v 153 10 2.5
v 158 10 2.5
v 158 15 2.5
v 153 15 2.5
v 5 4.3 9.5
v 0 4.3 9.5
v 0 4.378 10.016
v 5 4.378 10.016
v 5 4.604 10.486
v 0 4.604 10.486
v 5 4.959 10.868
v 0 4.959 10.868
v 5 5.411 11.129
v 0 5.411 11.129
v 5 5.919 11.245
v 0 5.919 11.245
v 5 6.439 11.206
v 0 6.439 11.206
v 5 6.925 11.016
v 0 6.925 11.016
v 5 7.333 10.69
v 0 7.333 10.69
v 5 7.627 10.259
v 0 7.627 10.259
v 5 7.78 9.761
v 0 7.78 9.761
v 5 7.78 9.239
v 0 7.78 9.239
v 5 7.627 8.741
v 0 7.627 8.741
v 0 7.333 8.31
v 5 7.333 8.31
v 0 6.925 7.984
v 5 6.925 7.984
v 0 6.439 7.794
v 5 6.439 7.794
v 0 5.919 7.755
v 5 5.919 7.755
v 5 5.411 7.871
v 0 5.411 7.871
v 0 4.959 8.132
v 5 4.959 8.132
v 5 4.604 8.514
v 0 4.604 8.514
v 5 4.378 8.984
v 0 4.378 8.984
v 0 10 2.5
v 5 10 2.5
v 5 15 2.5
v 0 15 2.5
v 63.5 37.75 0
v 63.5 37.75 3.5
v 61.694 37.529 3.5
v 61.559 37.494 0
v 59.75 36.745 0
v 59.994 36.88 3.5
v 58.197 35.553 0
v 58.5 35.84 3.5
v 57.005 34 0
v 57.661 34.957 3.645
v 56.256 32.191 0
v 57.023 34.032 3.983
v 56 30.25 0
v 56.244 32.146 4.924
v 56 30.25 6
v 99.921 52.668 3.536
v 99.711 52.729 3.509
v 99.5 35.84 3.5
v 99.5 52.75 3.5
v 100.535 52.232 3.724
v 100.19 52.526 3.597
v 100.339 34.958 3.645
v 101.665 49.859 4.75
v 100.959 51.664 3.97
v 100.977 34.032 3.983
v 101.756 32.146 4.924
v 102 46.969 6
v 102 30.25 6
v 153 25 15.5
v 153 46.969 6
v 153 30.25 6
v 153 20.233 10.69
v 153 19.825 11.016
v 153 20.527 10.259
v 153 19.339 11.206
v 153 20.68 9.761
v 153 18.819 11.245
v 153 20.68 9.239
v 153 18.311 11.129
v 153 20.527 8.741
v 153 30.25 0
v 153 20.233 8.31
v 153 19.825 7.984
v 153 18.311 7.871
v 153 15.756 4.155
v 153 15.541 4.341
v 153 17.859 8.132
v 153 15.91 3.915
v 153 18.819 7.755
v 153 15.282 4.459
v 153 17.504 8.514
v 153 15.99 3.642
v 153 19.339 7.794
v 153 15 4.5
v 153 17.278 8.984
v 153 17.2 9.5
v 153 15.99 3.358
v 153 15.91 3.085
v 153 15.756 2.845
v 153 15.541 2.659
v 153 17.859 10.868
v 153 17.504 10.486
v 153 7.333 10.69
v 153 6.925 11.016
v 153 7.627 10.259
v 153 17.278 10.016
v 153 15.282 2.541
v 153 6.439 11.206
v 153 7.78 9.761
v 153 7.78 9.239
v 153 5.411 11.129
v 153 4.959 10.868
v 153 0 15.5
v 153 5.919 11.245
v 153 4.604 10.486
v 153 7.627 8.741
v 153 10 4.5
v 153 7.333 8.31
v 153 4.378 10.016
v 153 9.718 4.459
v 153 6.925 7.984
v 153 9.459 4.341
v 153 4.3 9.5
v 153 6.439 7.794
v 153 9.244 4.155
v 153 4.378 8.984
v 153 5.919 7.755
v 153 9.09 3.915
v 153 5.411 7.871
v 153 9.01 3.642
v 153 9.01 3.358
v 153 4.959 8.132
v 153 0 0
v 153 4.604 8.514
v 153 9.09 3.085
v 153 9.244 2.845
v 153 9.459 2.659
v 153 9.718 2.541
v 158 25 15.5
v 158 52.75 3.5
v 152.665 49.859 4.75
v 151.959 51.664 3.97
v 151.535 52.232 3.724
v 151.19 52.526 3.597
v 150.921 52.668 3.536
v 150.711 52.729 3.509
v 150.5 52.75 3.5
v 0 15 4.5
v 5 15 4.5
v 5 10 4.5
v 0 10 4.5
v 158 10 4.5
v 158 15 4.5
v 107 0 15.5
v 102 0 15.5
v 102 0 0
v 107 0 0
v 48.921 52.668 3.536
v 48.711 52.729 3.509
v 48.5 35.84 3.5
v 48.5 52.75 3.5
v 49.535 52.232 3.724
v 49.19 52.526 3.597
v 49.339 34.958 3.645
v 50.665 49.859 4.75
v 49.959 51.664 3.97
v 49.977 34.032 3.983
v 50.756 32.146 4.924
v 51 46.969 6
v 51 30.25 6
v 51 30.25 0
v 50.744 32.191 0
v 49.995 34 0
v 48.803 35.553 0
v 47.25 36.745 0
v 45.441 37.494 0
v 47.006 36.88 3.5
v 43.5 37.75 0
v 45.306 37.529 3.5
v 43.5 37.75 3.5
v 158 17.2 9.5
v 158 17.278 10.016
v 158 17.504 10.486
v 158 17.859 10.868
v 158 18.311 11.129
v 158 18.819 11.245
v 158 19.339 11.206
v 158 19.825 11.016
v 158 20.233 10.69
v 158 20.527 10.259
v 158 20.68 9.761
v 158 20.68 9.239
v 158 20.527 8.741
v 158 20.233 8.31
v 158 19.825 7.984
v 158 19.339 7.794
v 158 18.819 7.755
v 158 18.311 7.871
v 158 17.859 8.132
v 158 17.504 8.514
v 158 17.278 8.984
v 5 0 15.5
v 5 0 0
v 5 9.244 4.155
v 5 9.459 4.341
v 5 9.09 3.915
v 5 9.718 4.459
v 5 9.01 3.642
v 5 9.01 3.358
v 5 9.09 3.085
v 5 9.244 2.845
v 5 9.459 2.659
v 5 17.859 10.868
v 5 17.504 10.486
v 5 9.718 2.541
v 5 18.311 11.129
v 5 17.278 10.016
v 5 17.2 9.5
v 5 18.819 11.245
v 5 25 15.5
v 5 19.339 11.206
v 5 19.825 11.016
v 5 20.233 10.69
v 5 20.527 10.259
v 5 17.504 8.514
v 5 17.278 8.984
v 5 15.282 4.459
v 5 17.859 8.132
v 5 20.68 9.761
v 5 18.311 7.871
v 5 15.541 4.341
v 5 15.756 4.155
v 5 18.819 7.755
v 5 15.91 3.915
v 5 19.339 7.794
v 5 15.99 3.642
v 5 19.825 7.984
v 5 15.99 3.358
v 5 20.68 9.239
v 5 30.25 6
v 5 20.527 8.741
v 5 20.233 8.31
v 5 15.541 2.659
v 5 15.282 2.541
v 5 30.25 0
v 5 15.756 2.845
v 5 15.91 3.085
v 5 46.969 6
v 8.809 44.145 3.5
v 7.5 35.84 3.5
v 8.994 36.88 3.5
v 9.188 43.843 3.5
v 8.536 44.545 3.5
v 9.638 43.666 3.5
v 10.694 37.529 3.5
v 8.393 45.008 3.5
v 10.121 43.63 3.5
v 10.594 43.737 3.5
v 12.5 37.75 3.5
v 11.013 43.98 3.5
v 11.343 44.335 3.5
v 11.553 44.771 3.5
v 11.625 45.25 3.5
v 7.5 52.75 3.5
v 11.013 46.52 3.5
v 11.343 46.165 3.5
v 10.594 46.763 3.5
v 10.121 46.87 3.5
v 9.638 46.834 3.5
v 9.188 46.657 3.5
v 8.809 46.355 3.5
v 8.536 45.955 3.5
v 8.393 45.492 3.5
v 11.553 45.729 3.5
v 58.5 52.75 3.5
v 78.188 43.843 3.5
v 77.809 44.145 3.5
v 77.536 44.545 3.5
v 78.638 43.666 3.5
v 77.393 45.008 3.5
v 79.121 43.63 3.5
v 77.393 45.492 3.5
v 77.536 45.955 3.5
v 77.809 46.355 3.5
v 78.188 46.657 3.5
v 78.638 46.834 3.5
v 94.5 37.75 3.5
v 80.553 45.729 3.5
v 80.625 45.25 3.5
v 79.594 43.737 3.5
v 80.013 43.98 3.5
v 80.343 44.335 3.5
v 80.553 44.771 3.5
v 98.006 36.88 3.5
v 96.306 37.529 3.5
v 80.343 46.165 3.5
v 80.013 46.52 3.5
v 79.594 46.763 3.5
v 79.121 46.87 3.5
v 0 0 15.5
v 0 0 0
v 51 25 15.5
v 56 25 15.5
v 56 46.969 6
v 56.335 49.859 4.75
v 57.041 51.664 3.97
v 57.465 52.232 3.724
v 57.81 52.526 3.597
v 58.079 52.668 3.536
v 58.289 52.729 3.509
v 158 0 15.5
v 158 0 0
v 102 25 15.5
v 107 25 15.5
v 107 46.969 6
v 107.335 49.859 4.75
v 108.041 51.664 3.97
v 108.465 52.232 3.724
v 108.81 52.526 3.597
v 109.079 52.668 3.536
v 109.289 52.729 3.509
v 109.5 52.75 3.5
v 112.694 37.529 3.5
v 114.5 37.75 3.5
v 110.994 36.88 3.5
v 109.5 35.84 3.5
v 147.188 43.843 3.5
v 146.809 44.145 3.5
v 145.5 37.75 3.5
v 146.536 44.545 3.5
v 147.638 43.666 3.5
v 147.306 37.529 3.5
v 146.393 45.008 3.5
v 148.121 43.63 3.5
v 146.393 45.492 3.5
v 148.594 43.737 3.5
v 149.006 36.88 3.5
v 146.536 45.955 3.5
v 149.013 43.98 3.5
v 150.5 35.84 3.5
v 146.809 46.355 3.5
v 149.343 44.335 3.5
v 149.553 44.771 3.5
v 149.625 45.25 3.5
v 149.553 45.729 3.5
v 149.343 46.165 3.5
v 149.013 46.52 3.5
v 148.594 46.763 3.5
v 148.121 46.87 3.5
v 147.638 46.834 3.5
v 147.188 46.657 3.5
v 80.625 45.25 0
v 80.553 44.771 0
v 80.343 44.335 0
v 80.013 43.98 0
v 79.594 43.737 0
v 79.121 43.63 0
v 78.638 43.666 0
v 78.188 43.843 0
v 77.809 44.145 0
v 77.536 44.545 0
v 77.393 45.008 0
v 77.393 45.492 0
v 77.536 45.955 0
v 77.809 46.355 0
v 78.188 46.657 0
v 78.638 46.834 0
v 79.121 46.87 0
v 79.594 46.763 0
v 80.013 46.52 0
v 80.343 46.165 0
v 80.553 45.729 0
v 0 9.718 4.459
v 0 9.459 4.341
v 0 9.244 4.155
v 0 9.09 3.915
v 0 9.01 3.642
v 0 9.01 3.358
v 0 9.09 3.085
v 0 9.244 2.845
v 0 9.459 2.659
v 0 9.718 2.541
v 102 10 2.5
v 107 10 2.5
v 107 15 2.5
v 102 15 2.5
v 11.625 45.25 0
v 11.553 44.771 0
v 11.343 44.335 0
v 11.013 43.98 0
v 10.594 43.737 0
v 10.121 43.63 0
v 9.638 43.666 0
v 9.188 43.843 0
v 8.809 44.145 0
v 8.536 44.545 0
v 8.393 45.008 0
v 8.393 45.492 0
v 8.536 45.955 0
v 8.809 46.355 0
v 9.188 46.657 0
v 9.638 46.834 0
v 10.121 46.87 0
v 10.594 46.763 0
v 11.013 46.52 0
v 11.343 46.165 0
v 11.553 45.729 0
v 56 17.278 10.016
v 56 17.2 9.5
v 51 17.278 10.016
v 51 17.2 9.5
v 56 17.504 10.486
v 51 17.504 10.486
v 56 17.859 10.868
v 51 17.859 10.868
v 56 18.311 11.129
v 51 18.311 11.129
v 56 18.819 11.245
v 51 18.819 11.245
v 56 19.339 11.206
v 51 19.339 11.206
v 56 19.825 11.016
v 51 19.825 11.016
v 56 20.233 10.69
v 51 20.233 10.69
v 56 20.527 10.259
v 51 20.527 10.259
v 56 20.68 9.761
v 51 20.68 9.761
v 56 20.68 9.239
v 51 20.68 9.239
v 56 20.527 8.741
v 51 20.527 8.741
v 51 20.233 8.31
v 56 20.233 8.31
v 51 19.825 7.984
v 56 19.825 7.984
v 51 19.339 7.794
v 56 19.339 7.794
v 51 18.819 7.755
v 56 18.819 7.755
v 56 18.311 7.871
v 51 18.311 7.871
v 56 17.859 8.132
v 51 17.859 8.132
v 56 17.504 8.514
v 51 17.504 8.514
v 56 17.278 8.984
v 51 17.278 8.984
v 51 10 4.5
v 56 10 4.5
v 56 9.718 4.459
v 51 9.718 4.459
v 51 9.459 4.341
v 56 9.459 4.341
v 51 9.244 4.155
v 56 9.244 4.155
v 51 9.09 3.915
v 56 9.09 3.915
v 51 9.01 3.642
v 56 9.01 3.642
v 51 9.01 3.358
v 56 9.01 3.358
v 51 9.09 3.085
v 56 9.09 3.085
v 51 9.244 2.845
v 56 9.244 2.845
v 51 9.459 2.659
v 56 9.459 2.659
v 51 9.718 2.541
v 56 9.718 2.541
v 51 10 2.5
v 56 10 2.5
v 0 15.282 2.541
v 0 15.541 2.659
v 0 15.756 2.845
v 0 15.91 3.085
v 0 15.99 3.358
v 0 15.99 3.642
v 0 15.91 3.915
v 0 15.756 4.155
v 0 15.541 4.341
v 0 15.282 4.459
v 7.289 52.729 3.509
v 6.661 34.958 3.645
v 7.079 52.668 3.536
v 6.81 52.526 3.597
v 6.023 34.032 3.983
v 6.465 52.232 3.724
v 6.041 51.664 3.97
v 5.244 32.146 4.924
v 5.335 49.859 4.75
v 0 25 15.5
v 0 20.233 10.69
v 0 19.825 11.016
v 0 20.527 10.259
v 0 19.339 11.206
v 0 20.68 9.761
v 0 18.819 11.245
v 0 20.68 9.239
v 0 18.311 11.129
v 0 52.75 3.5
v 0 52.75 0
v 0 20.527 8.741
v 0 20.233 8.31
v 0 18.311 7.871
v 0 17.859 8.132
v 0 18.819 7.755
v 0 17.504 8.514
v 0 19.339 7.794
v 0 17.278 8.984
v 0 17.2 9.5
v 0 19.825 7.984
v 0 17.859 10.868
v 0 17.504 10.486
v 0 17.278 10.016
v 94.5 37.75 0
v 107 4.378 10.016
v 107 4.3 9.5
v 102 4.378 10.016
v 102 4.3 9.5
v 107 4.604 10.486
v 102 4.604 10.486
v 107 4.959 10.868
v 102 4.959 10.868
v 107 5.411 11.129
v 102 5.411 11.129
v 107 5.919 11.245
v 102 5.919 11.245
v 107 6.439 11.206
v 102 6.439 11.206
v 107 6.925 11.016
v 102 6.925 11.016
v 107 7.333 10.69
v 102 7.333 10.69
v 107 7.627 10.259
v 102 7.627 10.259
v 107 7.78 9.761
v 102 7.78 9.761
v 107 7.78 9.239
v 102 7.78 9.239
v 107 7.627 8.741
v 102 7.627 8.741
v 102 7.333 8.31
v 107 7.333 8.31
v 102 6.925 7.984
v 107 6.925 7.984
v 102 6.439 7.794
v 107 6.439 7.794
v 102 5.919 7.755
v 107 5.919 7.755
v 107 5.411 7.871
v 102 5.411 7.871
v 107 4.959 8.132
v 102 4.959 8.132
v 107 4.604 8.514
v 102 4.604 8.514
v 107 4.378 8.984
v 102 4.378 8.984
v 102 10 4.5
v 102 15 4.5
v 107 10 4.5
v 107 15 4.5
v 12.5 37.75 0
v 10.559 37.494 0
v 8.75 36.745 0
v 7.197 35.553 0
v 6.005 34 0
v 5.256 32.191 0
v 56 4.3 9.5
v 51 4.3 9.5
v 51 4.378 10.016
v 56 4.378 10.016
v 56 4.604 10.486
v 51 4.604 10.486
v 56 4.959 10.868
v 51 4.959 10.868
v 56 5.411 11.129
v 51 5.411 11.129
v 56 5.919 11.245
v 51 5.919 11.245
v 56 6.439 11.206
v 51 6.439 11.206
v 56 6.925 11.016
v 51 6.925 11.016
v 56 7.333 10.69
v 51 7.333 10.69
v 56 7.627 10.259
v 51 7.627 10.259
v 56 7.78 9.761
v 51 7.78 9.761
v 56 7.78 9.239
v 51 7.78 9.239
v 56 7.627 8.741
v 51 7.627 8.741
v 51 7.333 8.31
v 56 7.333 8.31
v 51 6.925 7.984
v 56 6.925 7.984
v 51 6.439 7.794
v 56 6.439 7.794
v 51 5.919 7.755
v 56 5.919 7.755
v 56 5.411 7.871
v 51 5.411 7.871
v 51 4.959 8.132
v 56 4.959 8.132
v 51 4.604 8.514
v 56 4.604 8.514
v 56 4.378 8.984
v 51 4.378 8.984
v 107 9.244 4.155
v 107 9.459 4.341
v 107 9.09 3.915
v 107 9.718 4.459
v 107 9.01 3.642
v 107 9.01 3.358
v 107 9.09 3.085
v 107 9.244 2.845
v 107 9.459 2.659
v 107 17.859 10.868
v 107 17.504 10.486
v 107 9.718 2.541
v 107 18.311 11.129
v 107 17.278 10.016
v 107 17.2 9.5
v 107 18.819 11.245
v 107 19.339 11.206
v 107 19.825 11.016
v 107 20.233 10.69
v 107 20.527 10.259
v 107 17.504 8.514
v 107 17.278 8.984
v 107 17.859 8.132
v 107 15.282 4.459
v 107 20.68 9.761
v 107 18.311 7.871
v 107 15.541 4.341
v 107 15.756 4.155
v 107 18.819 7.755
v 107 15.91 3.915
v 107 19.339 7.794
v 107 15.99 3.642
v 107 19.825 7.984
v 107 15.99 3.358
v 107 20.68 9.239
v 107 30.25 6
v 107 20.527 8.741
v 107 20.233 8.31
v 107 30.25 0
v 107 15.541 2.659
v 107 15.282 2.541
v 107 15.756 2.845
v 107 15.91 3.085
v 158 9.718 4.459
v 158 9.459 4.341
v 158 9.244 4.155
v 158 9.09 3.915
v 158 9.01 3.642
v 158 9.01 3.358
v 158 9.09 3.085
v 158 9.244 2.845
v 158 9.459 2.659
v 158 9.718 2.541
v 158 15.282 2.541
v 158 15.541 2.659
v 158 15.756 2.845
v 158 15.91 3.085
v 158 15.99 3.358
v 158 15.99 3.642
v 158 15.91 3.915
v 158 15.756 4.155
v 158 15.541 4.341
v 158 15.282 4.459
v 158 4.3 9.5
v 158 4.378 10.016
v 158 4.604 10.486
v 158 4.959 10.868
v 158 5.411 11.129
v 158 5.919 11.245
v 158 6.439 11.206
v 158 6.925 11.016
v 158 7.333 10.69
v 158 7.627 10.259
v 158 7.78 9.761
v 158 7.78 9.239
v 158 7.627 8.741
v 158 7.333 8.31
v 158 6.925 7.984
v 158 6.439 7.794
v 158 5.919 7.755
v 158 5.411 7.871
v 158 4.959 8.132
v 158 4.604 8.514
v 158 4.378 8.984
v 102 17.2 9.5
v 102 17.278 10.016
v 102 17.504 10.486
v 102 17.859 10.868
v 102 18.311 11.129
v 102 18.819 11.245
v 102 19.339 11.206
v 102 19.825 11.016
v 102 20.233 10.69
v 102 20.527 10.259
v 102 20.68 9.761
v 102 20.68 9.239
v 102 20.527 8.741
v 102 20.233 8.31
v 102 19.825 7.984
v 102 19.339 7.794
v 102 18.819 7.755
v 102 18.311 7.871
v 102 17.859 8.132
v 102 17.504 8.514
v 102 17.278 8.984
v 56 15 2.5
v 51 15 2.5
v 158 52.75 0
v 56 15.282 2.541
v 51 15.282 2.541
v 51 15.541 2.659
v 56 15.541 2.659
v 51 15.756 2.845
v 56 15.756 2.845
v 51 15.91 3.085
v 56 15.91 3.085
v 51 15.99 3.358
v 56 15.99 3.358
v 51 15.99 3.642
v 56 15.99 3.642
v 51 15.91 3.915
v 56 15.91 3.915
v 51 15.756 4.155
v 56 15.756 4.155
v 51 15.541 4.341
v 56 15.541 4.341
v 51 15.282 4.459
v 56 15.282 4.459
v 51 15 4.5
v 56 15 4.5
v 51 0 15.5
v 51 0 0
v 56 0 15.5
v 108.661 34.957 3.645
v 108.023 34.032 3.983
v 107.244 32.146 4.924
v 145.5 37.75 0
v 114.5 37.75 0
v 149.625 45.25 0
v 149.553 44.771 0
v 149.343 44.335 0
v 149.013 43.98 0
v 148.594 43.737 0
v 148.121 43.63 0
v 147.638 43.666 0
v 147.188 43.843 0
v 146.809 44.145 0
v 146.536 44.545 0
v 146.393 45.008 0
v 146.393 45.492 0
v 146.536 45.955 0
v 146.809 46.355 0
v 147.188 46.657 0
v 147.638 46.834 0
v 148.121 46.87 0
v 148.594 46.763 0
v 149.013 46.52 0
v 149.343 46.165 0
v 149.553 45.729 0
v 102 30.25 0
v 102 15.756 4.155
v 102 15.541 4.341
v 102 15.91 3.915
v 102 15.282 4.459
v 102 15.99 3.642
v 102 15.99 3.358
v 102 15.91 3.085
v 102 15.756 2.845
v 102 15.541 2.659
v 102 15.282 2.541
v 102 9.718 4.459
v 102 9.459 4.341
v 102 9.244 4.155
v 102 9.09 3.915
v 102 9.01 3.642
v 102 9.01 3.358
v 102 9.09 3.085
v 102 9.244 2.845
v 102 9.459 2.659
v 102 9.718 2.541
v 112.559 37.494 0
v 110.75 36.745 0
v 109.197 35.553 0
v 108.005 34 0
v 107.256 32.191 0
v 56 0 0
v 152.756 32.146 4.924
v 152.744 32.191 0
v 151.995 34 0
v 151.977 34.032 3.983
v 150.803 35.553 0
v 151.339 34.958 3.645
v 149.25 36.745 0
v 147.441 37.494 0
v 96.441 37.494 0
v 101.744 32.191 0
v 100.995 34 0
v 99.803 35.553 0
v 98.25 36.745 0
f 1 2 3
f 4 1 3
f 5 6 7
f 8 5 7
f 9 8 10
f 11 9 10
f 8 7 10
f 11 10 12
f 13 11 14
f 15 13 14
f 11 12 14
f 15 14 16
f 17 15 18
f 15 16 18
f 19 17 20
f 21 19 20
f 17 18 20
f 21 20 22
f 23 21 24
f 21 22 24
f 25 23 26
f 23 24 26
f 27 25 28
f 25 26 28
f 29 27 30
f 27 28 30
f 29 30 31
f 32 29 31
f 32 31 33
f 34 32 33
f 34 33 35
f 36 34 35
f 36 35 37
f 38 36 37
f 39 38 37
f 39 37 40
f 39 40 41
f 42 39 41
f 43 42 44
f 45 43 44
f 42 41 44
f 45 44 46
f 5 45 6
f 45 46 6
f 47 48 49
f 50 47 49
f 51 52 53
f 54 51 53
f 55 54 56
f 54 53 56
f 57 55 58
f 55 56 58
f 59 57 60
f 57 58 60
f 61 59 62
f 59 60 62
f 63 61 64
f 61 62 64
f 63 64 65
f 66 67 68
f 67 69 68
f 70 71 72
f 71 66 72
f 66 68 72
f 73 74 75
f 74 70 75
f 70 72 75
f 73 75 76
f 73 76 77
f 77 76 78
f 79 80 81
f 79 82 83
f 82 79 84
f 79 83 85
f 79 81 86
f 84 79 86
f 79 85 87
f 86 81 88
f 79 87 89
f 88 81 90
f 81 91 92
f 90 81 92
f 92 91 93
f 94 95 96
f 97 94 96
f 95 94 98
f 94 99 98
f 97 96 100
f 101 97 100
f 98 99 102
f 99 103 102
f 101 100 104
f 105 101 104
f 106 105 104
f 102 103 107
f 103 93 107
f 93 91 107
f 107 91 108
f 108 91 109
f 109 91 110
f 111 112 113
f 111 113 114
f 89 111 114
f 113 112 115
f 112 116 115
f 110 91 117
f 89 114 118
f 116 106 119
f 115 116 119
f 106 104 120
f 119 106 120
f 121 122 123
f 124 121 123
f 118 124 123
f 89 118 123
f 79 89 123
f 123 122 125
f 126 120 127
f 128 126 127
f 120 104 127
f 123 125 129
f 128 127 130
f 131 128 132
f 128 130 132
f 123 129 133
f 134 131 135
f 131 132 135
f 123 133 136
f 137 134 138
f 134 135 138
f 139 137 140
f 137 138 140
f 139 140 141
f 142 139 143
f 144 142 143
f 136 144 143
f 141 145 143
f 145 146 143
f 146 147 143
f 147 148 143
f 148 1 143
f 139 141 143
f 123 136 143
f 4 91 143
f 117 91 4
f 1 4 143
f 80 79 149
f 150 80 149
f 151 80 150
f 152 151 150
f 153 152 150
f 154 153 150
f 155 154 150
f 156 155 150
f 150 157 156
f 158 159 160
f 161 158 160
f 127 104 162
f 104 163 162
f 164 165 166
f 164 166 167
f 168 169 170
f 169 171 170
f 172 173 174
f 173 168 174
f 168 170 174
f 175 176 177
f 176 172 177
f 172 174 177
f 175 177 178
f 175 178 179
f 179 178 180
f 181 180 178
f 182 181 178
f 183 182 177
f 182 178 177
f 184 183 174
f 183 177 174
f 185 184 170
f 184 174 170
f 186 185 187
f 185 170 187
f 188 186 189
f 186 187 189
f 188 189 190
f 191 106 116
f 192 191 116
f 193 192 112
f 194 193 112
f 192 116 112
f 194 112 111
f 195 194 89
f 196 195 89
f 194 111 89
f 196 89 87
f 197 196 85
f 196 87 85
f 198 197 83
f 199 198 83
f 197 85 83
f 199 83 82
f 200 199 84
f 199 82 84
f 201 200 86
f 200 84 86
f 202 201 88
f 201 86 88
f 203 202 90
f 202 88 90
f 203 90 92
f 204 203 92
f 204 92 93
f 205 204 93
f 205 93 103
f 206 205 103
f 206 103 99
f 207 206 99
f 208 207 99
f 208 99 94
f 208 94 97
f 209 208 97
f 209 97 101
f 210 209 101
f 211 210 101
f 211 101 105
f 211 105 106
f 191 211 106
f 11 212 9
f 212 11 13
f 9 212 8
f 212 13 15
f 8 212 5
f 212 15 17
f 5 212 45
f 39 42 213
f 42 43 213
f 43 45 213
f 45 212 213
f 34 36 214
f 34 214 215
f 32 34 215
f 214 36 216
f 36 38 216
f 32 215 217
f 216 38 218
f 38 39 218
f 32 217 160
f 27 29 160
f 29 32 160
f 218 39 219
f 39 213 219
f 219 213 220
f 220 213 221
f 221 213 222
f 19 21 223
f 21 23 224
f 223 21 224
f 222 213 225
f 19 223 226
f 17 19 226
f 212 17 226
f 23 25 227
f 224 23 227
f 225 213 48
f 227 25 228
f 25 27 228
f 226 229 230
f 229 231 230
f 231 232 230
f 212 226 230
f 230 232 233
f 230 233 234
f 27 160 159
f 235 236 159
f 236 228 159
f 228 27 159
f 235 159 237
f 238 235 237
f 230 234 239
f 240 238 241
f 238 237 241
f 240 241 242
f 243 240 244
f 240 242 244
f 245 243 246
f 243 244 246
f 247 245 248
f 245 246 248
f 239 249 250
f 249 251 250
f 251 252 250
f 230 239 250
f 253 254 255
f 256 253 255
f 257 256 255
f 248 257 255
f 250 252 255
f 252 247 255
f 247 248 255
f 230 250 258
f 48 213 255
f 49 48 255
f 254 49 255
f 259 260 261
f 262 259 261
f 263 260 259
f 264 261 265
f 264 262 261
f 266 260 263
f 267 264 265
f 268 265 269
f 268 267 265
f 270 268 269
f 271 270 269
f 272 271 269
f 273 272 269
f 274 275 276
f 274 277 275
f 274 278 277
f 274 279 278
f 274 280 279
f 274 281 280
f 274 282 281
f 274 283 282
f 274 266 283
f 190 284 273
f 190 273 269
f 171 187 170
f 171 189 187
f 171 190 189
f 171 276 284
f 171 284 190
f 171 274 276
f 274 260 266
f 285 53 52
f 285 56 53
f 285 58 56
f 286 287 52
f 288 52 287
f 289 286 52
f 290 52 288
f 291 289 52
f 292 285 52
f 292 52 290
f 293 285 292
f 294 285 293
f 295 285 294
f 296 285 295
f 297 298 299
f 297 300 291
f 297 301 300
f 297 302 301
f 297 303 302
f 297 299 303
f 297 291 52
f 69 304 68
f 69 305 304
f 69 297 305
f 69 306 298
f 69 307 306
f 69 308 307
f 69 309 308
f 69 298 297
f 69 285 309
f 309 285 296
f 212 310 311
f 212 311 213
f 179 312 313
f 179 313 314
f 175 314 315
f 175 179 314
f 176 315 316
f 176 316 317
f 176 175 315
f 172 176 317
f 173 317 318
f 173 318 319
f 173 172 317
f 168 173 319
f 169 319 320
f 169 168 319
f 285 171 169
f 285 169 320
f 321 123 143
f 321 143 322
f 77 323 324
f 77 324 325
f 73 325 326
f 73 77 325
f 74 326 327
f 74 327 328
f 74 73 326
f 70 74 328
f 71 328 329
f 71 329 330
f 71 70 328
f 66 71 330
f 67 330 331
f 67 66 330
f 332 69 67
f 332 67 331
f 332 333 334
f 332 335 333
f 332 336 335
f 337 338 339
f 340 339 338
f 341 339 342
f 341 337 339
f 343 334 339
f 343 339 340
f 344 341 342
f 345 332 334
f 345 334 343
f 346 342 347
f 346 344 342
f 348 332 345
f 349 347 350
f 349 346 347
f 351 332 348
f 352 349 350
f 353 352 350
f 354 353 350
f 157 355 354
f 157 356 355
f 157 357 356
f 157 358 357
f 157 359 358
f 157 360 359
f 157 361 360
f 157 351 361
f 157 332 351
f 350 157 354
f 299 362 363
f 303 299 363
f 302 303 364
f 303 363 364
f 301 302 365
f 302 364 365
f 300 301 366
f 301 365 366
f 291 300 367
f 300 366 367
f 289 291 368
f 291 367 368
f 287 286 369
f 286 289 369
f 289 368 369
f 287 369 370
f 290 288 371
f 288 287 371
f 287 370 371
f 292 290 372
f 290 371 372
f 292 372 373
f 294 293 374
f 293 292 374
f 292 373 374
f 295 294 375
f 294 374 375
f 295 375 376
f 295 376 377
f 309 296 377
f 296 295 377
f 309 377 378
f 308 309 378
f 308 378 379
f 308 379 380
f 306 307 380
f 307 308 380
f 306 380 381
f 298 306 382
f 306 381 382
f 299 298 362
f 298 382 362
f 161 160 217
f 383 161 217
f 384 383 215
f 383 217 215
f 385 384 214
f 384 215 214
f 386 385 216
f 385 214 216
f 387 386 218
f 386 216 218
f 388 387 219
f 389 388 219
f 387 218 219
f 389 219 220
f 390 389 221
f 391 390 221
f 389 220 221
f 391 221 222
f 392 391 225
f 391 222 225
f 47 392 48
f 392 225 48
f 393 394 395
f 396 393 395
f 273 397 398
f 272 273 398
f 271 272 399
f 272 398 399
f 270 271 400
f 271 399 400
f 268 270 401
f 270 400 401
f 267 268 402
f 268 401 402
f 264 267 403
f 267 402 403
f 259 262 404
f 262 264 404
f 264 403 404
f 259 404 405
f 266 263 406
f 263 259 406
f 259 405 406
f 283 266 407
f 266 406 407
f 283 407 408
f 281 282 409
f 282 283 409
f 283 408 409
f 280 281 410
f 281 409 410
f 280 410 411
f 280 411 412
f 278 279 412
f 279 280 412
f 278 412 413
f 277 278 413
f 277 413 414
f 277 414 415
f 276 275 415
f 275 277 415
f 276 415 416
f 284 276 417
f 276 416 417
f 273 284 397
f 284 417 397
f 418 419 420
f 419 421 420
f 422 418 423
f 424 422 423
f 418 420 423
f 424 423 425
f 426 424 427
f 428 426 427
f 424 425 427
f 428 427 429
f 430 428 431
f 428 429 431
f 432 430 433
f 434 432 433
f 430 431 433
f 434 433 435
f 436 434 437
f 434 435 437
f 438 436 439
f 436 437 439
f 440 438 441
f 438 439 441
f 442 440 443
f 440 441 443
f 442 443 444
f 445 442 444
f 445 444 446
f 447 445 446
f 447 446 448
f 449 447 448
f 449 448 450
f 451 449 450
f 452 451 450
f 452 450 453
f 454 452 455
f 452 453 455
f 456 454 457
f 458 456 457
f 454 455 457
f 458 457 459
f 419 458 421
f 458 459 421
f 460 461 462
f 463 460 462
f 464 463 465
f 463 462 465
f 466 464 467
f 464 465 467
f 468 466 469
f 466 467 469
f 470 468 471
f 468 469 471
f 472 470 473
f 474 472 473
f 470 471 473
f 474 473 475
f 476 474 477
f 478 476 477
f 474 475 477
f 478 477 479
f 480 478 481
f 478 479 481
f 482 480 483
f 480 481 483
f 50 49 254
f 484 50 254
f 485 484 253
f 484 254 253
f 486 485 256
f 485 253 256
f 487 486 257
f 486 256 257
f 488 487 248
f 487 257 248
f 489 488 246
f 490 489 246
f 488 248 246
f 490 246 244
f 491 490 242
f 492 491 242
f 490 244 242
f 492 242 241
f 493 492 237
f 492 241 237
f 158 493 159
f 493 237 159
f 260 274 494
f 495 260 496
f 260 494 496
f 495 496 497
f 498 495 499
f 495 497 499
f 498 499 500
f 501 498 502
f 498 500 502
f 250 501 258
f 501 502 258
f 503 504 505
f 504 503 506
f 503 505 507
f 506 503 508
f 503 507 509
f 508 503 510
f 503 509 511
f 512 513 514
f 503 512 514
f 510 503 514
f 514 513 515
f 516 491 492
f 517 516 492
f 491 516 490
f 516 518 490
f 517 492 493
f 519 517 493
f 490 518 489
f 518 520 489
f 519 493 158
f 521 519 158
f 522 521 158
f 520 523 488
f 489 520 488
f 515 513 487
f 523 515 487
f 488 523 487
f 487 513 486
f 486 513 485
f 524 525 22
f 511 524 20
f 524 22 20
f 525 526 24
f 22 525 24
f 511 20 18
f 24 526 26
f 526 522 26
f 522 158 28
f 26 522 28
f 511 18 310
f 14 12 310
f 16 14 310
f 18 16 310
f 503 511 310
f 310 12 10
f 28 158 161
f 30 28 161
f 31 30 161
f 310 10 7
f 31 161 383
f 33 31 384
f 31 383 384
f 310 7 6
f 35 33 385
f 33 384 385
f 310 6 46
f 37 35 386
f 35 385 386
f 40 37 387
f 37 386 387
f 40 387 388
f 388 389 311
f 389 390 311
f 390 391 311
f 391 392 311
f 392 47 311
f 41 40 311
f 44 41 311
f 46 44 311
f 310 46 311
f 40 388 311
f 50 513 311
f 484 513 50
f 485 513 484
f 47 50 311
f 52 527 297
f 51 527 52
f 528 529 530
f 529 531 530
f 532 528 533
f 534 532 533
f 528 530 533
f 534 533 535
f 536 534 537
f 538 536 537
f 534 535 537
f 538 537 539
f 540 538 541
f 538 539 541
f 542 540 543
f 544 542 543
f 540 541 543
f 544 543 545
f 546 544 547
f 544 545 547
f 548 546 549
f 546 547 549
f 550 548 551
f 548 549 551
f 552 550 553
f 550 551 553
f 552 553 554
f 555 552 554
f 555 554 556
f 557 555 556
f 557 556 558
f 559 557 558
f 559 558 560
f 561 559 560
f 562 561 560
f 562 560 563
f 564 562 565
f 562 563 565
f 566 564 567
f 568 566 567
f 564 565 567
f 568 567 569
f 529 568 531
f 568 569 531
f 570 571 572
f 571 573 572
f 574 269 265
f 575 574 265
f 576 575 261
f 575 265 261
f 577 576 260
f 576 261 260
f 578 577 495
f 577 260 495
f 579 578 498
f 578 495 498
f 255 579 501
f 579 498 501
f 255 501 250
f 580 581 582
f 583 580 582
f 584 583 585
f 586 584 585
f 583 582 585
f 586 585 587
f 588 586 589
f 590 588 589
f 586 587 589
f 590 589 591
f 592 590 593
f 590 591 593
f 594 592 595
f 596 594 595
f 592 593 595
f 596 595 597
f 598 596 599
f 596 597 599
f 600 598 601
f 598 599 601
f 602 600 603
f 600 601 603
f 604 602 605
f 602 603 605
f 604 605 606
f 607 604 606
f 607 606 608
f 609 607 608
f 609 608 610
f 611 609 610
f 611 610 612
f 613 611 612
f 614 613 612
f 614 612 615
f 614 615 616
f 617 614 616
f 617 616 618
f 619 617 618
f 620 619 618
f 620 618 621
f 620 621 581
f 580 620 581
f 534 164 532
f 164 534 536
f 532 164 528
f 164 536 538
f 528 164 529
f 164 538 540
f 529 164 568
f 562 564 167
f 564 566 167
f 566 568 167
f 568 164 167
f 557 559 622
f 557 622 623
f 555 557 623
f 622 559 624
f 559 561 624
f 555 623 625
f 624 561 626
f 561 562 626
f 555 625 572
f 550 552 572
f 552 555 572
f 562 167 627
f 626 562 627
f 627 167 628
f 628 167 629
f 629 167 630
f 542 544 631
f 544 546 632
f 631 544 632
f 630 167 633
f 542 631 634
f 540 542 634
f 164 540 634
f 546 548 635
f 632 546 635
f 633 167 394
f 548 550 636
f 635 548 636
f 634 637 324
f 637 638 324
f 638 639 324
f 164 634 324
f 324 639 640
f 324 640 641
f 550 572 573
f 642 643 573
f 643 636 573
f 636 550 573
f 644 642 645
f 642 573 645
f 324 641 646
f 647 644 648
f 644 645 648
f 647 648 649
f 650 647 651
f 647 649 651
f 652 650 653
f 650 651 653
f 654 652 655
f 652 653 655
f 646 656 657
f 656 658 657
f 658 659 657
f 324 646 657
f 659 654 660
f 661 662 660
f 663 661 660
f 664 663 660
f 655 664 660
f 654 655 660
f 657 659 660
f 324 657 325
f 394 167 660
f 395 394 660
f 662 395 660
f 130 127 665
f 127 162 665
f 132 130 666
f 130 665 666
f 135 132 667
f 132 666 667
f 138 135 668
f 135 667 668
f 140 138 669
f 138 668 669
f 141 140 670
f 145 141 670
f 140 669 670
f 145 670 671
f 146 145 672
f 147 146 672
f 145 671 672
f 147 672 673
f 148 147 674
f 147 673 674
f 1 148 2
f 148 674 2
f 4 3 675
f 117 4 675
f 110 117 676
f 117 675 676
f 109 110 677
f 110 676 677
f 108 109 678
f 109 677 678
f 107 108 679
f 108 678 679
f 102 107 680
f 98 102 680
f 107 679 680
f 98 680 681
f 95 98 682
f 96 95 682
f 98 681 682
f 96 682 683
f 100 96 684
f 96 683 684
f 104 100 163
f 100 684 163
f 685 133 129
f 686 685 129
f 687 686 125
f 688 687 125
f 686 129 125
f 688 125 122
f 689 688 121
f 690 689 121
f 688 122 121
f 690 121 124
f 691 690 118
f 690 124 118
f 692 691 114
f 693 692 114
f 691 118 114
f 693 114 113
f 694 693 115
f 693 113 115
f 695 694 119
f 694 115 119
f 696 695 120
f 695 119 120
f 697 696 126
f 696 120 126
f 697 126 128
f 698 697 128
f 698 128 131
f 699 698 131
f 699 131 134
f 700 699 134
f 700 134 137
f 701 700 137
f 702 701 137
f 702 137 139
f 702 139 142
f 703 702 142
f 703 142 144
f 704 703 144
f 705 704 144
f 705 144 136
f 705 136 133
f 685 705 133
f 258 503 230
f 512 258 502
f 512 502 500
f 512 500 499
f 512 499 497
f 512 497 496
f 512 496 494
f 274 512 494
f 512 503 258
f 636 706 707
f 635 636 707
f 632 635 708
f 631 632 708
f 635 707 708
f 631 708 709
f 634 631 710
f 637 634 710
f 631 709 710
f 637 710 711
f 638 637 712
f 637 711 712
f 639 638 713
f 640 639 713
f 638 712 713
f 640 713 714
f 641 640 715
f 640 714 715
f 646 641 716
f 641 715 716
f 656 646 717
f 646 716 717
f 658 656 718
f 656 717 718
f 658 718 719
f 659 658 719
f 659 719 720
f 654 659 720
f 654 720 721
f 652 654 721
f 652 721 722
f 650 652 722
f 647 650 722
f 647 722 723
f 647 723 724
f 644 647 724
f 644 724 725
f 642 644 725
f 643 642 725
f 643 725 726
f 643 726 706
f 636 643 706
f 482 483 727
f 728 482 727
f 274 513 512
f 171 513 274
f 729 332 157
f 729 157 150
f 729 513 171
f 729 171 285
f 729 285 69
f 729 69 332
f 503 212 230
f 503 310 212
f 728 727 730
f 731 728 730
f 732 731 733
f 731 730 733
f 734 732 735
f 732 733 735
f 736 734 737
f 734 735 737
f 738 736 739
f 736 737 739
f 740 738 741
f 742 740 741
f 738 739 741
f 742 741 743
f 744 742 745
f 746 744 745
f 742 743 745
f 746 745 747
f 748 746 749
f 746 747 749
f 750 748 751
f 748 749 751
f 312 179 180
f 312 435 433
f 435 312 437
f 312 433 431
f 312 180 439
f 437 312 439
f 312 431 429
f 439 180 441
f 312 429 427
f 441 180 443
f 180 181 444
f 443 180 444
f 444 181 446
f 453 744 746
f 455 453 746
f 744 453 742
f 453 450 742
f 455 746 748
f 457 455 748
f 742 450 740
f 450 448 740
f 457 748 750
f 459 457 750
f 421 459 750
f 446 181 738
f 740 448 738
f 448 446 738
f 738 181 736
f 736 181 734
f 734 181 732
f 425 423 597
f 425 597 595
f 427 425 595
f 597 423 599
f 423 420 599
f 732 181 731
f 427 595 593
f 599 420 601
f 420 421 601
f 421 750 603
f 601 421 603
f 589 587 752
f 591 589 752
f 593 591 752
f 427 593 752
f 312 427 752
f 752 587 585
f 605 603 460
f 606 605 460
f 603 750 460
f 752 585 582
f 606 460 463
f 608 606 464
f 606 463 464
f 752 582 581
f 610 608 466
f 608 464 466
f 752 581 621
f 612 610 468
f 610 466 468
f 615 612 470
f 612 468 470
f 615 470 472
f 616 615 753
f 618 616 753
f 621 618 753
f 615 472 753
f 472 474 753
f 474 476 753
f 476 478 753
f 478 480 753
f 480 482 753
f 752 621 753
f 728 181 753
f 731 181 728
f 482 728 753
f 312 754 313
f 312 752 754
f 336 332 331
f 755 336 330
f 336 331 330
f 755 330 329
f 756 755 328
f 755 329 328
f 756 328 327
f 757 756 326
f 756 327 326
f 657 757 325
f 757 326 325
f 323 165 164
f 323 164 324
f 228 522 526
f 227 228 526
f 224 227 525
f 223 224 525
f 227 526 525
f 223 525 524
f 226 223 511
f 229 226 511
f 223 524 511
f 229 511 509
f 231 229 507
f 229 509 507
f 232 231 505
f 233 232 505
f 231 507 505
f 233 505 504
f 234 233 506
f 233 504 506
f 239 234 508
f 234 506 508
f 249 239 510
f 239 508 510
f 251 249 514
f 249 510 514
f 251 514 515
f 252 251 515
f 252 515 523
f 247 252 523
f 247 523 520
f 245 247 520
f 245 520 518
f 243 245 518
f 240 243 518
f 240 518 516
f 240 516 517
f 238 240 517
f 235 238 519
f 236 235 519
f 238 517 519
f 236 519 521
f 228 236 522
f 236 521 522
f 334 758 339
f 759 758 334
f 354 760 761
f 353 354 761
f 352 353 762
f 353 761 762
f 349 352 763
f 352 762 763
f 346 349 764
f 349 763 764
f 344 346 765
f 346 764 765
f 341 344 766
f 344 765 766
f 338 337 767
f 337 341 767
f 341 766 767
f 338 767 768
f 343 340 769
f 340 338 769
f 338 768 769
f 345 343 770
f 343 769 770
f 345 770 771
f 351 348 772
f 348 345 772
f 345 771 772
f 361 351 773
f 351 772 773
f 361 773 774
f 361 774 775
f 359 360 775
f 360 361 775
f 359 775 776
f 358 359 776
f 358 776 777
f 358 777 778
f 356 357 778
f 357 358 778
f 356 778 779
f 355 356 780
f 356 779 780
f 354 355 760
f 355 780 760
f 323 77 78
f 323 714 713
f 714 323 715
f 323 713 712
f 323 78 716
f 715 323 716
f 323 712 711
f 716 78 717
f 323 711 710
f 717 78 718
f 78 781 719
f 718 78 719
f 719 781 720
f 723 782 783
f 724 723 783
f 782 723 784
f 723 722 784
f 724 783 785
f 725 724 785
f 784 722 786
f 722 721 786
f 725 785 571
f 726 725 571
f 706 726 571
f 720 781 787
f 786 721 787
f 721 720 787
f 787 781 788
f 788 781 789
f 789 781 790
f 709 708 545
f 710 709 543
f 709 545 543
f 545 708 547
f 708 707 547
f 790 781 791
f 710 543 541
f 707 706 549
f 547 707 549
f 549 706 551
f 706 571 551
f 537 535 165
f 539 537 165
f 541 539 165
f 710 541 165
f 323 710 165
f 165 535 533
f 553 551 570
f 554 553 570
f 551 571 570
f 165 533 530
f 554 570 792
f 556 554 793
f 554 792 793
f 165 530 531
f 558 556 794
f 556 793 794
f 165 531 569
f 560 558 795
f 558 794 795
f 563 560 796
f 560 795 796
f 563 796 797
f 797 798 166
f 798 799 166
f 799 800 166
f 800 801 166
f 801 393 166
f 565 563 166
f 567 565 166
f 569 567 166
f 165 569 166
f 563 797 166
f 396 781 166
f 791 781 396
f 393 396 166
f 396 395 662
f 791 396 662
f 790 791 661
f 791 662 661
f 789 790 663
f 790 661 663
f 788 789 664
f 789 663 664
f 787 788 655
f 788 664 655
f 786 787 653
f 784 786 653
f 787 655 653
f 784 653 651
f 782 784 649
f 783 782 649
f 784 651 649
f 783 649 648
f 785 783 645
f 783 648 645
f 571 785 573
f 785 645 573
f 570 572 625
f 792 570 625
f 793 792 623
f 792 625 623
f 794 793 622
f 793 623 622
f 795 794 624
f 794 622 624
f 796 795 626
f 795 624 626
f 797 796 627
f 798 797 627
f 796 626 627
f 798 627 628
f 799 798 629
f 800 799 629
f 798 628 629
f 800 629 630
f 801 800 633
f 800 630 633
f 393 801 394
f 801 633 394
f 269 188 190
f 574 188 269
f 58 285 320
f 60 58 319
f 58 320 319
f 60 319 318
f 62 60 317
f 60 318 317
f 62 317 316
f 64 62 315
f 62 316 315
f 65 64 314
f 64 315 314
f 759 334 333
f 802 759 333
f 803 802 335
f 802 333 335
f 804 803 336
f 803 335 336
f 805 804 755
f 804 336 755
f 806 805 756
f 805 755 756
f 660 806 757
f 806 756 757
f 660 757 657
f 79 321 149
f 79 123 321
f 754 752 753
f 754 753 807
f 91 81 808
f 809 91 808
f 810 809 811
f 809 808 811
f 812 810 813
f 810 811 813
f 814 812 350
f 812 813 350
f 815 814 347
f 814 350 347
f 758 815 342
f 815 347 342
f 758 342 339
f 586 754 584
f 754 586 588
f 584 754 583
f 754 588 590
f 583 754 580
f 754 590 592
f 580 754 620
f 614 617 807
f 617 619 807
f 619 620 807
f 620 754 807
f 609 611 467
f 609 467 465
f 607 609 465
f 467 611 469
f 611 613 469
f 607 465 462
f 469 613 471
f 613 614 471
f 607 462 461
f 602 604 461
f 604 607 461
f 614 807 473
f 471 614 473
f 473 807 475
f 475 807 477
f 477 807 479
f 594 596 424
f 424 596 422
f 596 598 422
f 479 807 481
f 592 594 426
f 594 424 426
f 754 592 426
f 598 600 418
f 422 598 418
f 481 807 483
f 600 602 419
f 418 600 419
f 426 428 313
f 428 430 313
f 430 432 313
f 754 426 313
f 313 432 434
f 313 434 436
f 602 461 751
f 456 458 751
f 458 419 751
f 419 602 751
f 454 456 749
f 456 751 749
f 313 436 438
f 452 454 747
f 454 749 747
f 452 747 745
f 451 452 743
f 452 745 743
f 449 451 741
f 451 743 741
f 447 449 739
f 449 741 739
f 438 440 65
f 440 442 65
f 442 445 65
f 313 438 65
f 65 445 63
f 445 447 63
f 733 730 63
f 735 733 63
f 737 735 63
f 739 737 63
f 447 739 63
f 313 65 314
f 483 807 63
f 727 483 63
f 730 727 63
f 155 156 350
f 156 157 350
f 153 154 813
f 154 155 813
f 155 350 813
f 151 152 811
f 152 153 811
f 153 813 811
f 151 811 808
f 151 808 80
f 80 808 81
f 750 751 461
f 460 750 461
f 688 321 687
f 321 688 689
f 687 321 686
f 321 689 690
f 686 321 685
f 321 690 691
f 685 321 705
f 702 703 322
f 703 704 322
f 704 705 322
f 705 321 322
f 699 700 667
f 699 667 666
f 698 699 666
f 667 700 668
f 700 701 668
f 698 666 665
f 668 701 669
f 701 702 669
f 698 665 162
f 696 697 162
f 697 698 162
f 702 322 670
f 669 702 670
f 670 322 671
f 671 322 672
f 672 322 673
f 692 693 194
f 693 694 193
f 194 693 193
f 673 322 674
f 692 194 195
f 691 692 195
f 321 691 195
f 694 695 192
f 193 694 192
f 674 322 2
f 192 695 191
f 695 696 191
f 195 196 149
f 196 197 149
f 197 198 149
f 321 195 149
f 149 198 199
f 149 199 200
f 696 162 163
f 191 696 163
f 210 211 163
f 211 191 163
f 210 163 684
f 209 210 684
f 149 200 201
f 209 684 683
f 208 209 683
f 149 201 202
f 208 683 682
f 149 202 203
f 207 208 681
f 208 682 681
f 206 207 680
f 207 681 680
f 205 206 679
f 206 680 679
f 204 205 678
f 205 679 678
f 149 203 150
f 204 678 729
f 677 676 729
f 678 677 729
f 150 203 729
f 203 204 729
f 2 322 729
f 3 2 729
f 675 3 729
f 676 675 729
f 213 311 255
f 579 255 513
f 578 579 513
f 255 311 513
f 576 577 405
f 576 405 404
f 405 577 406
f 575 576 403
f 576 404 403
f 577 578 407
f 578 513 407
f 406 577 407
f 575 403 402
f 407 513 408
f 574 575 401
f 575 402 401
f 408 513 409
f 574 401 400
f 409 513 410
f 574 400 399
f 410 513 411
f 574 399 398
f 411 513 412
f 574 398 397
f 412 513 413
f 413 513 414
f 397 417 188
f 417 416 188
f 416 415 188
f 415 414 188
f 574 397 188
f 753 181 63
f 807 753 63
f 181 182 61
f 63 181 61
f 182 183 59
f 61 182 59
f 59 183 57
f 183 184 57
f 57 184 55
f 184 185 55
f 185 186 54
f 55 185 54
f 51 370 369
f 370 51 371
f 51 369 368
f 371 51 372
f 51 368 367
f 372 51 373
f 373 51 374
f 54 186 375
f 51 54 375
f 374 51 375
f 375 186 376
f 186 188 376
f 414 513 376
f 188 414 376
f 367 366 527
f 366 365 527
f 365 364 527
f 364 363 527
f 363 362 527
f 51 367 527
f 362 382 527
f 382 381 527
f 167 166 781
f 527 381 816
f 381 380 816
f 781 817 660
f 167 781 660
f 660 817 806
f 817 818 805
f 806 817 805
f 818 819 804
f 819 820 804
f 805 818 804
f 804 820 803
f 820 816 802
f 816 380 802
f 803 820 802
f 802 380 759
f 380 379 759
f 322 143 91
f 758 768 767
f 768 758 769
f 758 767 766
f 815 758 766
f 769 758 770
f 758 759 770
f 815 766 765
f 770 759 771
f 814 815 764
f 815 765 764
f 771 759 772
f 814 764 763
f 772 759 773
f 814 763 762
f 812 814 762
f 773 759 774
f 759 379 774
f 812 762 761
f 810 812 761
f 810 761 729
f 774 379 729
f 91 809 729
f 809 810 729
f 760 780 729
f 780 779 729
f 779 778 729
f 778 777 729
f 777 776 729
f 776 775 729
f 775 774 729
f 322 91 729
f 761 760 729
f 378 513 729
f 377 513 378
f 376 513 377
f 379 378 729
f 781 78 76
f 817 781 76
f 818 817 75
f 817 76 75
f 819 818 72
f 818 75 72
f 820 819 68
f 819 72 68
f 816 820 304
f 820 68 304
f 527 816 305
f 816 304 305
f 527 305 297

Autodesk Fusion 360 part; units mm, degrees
sketch "Sketch1" plane through (0, 0, 0) normal (0, 0, 1) x (1, 0, 0)
  line L0 (0, 0) -> (5, 0)
  line L1 (5, 0) -> (5, 37.75)
  line L2 (0, 52.75) -> (0, 0)
  line L3 (51, 37.75) -> (51, 0)
  line L4 (51, 0) -> (56, 0)
  line L5 (56, 0) -> (56, 37.75)
  line L6 (102, 37.75) -> (102, 0)
  line L7 (102, 0) -> (107, 0)
  line L8 (107, 0) -> (107, 37.75)
  line L9 (153, 37.75) -> (153, 0)
  line L10 (153, 0) -> (158, 0)
  line L11 (158, 0) -> (158, 52.75)
  line L12 (0, 52.75) -> (158, 52.75)
  line L13 (51, 37.75) -> (5, 37.75)
  line L14 (153, 37.75) -> (107, 37.75)
  line L15 (102, 37.75) -> (56, 37.75)
  line L16 (0, 45.25) -> (158, 45.25) construction
  circle A0 centre (10, 45.25) radius 1.625
  circle A1 centre (79, 45.25) radius 1.625
  circle A2 centre (148, 45.25) radius 1.625
  dimension "d2" = 52.75
  dimension "d10" = 7.5
  dimension "d11" = 3.25
  dimension "d12" = 10
  dimension "d13" = 10
  dimension "d25" = 15
extrude "Extrude1" add sketch "Sketch1" along normal blind 3.5 makes body 1
sketch "Sketch2" plane through (0, 0, 0) normal (-1, 0, 0) x (0, -1, 0)
  line L0 (-52.75, 0) -> (0, 0)
  line L1 (0, 0) -> (0, 3.5)
  line L2 (0, 3.5) -> (-52.75, 3.5)
  line L3 (-52.75, 3.5) -> (-52.75, 0)
  line L4 (0, 3.5) -> (0, 15.5)
  line L5 (0, 15.5) -> (-25, 15.5)
  line L6 (0, 9.5) -> (-18.95, 9.5) construction
  circle A0 centre (-6.05, 9.5) radius 1.75
  circle A1 centre (-18.95, 9.5) radius 1.75
  line L7 (-25, 15.5) -> (-52.75, 3.5)
  dimension "d16" = 25
  dimension "d19" = 9.5
  dimension "d20" = 3.5
  dimension "d23" = 6.05
  dimension "d24" = 12.9
  dimension "d26" = 15.5
extrude "Extrude2" add sketch "Sketch2" against normal blind 5 separate body contours L2 L4 L5 L7 makes body 2
pattern_linear "R-Pattern1" count 4 spacing 51 along (1, 0, 0) of bodies 2 makes body 3 at (51, 32.7908, 9.3281) makes body 4 at (102, 32.7908, 9.3281) makes body 5 at (153, 32.7908, 9.3281)
combine "Combine1" operation add target body 1 tool bodies 2 3 4 5
fillet "Fillet2" radius 7.5 6 edges at (5, 37.75, 1.75) (51, 37.75, 1.75) (56, 37.75, 1.75) (102, 37.75, 1.75) (107, 37.75, 1.75) (153, 37.75, 1.75) on bodies 1
fillet "Fillet3" radius 2.5 6 edges at (102, 41.5, 3.5) (51, 41.5, 3.5) (153, 41.5, 3.5) (5, 41.5, 3.5) (56, 41.5, 3.5) (107, 41.5, 3.5) on bodies 1
sketch "Sketch3" plane through (158, 0, 0) normal (1, 0, 0) x (0, 1, 0)
  circle A0 centre (6.05, 9.5) radius 1.75
  circle A1 centre (18.95, 9.5) radius 1.75
  line L0 (0, 0) -> (52.75, 0)
  line L1 (52.75, 0) -> (52.75, 3.5)
  line L2 (52.75, 3.5) -> (25, 15.5)
  line L3 (25, 15.5) -> (0, 15.5)
  line L4 (0, 15.5) -> (0, 0)
  line L5 (6.05, 9.5) -> (18.95, 9.5) construction
  line L6 (12.5, 9.5) -> (12.5, 3.5) construction
  line L7 (10, 2.5) -> (15, 2.5)
  arc A2 (15, 2.5) -> (15, 4.5) centre (15, 3.5) ccw
  line L8 (15, 4.5) -> (10, 4.5)
  arc A3 (10, 4.5) -> (10, 2.5) centre (10, 3.5) ccw
  line L9 (10, 3.5) -> (15, 3.5) construction
  point P0 (12.5, 3.5)
  dimension "d39" = 3.5
  dimension "d40" = 2.5
  dimension "d41" = 1
extrude "Extrude3" cut sketch "Sketch3" against normal blind 160 contours L7 A2 L8 A3 bodies 1
equation "d2 = 36.25 mm + 15 mm + 1.5 mm"
equation "d23 = 4.55 mm + 1.5 mm"
